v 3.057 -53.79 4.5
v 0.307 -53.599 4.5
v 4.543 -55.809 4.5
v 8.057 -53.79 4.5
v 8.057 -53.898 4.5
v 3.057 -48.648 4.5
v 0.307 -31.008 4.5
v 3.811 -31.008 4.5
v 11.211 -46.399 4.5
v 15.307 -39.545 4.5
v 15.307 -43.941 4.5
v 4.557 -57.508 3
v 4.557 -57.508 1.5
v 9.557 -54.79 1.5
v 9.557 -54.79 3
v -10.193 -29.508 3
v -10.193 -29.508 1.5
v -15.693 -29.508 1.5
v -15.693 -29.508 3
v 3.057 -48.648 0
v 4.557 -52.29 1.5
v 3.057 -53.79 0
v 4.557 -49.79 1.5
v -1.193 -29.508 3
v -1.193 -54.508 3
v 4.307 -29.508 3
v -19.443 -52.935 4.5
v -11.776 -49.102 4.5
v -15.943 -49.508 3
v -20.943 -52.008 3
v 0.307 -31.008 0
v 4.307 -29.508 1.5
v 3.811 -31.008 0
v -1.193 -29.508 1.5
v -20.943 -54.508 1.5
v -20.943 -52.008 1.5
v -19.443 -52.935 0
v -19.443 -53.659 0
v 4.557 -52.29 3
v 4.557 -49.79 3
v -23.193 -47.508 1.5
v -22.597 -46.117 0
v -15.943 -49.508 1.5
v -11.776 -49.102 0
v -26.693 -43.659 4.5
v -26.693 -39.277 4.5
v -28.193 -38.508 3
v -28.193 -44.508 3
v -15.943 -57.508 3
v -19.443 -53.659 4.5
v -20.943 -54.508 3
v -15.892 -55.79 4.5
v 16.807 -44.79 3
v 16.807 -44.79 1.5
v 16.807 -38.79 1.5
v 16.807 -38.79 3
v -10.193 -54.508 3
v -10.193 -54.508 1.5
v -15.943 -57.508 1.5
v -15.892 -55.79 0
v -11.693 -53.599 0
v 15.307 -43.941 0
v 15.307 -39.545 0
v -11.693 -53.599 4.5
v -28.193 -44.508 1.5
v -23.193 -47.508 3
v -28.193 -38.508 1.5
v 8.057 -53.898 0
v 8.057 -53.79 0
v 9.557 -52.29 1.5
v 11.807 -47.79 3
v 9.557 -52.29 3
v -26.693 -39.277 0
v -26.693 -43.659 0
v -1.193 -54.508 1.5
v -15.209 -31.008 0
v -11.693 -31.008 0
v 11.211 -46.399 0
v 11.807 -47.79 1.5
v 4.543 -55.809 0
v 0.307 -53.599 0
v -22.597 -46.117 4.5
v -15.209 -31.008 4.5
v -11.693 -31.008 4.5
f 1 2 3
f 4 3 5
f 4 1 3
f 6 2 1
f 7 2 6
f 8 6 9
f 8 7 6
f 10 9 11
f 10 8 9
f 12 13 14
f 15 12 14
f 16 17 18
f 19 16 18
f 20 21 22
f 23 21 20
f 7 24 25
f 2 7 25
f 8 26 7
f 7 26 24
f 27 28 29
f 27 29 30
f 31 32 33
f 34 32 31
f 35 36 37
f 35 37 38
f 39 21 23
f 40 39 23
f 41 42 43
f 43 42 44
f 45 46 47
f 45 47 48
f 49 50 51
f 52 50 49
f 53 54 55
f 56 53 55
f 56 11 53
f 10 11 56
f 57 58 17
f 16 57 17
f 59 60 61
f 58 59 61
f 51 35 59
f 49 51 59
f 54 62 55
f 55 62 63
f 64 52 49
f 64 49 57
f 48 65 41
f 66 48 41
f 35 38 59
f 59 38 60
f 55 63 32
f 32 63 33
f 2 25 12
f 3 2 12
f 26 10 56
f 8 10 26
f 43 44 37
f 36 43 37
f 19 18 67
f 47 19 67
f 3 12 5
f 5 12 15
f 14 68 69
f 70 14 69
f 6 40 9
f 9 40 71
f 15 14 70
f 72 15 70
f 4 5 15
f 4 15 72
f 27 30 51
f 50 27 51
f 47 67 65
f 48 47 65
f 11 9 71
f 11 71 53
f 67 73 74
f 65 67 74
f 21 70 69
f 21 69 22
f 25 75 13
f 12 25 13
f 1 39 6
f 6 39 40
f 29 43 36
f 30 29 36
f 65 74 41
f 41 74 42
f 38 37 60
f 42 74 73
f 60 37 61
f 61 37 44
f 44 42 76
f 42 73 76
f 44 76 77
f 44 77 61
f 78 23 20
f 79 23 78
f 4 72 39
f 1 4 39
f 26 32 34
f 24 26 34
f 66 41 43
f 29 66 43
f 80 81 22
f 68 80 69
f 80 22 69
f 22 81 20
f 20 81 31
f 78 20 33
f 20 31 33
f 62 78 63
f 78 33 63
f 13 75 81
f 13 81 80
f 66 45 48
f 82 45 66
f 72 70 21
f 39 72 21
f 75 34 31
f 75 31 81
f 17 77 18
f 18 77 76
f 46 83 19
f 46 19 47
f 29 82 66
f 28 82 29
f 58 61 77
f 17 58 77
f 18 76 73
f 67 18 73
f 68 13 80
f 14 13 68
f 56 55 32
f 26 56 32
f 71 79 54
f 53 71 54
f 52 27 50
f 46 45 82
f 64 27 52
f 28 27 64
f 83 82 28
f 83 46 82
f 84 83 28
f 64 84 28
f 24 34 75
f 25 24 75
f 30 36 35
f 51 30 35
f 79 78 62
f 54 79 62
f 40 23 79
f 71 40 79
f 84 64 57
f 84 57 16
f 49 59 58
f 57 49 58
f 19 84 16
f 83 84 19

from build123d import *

# Parameters (mm, degrees)
F1_DEPTH = 4.5
F2_DEPTH = 4.5
F3_SIZE  = 1.5


with BuildPart() as f1:
    # F0 (on Top) → F1 (new body)
    with BuildSketch(Plane.XY):
        Polygon((16.807074, -44.790203), (16.807074, -38.790203), (4.307074, -29.508229), (-1.192926, -29.508229), (-1.192926, -52.008229), (-1.192926, -54.508229), (4.557074, -57.508229), (9.557074, -54.790203), (9.557074, -52.290203), (4.557074, -52.290203), (4.557074, -49.790203), (11.807074, -47.790203), align=None)
    extrude(amount=F1_DEPTH)

    # F0 (on Top) → F2 (join)
    with BuildSketch(Plane.XY):
        Polygon((-15.692926, -29.508229), (-28.192926, -38.508229), (-28.192926, -44.508229), (-23.192926, -47.508229), (-15.942926, -49.508229), (-20.942926, -52.008229), (-20.942926, -54.508229), (-15.942926, -57.508229), (-10.192926, -54.508229), (-10.192926, -52.008229), (-10.192926, -29.508229), align=None)
        Polygon((16.807074, -44.790203), (16.807074, -38.790203), (4.307074, -29.508229), (-1.192926, -29.508229), (-1.192926, -52.008229), (-1.192926, -54.508229), (4.557074, -57.508229), (9.557074, -54.790203), (9.557074, -52.290203), (4.557074, -52.290203), (4.557074, -49.790203), (11.807074, -47.790203), align=None)
    extrude(amount=F2_DEPTH)

    # F3
    f3_edges = [f1.edges().sort_by_distance(p)[0] for p in [
        (10.557074, -34.149216, 4.5),
        (1.557074, -29.508229, 4.5),
        (-1.192926, -42.008229, 4.5),
        (1.682074, -56.008229, 4.5),
        (7.057074, -56.149216, 4.5),
        (9.557074, -53.540203, 4.5),
        (7.057074, -52.290203, 4.5),
        (4.557074, -51.040203, 4.5),
        (8.182074, -48.790203, 4.5),
        (14.307074, -46.290203, 4.5),
        (16.807074, -41.790203, 4.5),
        (10.557074, -34.149216, 0),
        (1.557074, -29.508229, 0),
        (-1.192926, -42.008229, 0),
        (1.682074, -56.008229, 0),
        (7.057074, -56.149216, 0),
        (9.557074, -53.540203, 0),
        (7.057074, -52.290203, 0),
        (4.557074, -51.040203, 0),
        (8.182074, -48.790203, 0),
        (14.307074, -46.290203, 0),
        (16.807074, -41.790203, 0),
        (-10.192926, -42.008229, 4.5),
        (-12.942926, -29.508229, 4.5),
        (-21.942926, -34.008229, 4.5),
        (-28.192926, -41.508229, 4.5),
        (-25.692926, -46.008229, 4.5),
        (-19.567926, -48.508229, 4.5),
        (-18.442926, -50.758229, 4.5),
        (-20.942926, -53.258229, 4.5),
        (-18.442926, -56.008229, 4.5),
        (-13.067926, -56.008229, 4.5),
        (-10.192926, -42.008229, 0),
        (-12.942926, -29.508229, 0),
        (-21.942926, -34.008229, 0),
        (-28.192926, -41.508229, 0),
        (-25.692926, -46.008229, 0),
        (-19.567926, -48.508229, 0),
        (-18.442926, -50.758229, 0),
        (-20.942926, -53.258229, 0),
        (-18.442926, -56.008229, 0),
        (-13.067926, -56.008229, 0),
    ]]
    chamfer(f3_edges, length=F3_SIZE)


solid = f1.part
